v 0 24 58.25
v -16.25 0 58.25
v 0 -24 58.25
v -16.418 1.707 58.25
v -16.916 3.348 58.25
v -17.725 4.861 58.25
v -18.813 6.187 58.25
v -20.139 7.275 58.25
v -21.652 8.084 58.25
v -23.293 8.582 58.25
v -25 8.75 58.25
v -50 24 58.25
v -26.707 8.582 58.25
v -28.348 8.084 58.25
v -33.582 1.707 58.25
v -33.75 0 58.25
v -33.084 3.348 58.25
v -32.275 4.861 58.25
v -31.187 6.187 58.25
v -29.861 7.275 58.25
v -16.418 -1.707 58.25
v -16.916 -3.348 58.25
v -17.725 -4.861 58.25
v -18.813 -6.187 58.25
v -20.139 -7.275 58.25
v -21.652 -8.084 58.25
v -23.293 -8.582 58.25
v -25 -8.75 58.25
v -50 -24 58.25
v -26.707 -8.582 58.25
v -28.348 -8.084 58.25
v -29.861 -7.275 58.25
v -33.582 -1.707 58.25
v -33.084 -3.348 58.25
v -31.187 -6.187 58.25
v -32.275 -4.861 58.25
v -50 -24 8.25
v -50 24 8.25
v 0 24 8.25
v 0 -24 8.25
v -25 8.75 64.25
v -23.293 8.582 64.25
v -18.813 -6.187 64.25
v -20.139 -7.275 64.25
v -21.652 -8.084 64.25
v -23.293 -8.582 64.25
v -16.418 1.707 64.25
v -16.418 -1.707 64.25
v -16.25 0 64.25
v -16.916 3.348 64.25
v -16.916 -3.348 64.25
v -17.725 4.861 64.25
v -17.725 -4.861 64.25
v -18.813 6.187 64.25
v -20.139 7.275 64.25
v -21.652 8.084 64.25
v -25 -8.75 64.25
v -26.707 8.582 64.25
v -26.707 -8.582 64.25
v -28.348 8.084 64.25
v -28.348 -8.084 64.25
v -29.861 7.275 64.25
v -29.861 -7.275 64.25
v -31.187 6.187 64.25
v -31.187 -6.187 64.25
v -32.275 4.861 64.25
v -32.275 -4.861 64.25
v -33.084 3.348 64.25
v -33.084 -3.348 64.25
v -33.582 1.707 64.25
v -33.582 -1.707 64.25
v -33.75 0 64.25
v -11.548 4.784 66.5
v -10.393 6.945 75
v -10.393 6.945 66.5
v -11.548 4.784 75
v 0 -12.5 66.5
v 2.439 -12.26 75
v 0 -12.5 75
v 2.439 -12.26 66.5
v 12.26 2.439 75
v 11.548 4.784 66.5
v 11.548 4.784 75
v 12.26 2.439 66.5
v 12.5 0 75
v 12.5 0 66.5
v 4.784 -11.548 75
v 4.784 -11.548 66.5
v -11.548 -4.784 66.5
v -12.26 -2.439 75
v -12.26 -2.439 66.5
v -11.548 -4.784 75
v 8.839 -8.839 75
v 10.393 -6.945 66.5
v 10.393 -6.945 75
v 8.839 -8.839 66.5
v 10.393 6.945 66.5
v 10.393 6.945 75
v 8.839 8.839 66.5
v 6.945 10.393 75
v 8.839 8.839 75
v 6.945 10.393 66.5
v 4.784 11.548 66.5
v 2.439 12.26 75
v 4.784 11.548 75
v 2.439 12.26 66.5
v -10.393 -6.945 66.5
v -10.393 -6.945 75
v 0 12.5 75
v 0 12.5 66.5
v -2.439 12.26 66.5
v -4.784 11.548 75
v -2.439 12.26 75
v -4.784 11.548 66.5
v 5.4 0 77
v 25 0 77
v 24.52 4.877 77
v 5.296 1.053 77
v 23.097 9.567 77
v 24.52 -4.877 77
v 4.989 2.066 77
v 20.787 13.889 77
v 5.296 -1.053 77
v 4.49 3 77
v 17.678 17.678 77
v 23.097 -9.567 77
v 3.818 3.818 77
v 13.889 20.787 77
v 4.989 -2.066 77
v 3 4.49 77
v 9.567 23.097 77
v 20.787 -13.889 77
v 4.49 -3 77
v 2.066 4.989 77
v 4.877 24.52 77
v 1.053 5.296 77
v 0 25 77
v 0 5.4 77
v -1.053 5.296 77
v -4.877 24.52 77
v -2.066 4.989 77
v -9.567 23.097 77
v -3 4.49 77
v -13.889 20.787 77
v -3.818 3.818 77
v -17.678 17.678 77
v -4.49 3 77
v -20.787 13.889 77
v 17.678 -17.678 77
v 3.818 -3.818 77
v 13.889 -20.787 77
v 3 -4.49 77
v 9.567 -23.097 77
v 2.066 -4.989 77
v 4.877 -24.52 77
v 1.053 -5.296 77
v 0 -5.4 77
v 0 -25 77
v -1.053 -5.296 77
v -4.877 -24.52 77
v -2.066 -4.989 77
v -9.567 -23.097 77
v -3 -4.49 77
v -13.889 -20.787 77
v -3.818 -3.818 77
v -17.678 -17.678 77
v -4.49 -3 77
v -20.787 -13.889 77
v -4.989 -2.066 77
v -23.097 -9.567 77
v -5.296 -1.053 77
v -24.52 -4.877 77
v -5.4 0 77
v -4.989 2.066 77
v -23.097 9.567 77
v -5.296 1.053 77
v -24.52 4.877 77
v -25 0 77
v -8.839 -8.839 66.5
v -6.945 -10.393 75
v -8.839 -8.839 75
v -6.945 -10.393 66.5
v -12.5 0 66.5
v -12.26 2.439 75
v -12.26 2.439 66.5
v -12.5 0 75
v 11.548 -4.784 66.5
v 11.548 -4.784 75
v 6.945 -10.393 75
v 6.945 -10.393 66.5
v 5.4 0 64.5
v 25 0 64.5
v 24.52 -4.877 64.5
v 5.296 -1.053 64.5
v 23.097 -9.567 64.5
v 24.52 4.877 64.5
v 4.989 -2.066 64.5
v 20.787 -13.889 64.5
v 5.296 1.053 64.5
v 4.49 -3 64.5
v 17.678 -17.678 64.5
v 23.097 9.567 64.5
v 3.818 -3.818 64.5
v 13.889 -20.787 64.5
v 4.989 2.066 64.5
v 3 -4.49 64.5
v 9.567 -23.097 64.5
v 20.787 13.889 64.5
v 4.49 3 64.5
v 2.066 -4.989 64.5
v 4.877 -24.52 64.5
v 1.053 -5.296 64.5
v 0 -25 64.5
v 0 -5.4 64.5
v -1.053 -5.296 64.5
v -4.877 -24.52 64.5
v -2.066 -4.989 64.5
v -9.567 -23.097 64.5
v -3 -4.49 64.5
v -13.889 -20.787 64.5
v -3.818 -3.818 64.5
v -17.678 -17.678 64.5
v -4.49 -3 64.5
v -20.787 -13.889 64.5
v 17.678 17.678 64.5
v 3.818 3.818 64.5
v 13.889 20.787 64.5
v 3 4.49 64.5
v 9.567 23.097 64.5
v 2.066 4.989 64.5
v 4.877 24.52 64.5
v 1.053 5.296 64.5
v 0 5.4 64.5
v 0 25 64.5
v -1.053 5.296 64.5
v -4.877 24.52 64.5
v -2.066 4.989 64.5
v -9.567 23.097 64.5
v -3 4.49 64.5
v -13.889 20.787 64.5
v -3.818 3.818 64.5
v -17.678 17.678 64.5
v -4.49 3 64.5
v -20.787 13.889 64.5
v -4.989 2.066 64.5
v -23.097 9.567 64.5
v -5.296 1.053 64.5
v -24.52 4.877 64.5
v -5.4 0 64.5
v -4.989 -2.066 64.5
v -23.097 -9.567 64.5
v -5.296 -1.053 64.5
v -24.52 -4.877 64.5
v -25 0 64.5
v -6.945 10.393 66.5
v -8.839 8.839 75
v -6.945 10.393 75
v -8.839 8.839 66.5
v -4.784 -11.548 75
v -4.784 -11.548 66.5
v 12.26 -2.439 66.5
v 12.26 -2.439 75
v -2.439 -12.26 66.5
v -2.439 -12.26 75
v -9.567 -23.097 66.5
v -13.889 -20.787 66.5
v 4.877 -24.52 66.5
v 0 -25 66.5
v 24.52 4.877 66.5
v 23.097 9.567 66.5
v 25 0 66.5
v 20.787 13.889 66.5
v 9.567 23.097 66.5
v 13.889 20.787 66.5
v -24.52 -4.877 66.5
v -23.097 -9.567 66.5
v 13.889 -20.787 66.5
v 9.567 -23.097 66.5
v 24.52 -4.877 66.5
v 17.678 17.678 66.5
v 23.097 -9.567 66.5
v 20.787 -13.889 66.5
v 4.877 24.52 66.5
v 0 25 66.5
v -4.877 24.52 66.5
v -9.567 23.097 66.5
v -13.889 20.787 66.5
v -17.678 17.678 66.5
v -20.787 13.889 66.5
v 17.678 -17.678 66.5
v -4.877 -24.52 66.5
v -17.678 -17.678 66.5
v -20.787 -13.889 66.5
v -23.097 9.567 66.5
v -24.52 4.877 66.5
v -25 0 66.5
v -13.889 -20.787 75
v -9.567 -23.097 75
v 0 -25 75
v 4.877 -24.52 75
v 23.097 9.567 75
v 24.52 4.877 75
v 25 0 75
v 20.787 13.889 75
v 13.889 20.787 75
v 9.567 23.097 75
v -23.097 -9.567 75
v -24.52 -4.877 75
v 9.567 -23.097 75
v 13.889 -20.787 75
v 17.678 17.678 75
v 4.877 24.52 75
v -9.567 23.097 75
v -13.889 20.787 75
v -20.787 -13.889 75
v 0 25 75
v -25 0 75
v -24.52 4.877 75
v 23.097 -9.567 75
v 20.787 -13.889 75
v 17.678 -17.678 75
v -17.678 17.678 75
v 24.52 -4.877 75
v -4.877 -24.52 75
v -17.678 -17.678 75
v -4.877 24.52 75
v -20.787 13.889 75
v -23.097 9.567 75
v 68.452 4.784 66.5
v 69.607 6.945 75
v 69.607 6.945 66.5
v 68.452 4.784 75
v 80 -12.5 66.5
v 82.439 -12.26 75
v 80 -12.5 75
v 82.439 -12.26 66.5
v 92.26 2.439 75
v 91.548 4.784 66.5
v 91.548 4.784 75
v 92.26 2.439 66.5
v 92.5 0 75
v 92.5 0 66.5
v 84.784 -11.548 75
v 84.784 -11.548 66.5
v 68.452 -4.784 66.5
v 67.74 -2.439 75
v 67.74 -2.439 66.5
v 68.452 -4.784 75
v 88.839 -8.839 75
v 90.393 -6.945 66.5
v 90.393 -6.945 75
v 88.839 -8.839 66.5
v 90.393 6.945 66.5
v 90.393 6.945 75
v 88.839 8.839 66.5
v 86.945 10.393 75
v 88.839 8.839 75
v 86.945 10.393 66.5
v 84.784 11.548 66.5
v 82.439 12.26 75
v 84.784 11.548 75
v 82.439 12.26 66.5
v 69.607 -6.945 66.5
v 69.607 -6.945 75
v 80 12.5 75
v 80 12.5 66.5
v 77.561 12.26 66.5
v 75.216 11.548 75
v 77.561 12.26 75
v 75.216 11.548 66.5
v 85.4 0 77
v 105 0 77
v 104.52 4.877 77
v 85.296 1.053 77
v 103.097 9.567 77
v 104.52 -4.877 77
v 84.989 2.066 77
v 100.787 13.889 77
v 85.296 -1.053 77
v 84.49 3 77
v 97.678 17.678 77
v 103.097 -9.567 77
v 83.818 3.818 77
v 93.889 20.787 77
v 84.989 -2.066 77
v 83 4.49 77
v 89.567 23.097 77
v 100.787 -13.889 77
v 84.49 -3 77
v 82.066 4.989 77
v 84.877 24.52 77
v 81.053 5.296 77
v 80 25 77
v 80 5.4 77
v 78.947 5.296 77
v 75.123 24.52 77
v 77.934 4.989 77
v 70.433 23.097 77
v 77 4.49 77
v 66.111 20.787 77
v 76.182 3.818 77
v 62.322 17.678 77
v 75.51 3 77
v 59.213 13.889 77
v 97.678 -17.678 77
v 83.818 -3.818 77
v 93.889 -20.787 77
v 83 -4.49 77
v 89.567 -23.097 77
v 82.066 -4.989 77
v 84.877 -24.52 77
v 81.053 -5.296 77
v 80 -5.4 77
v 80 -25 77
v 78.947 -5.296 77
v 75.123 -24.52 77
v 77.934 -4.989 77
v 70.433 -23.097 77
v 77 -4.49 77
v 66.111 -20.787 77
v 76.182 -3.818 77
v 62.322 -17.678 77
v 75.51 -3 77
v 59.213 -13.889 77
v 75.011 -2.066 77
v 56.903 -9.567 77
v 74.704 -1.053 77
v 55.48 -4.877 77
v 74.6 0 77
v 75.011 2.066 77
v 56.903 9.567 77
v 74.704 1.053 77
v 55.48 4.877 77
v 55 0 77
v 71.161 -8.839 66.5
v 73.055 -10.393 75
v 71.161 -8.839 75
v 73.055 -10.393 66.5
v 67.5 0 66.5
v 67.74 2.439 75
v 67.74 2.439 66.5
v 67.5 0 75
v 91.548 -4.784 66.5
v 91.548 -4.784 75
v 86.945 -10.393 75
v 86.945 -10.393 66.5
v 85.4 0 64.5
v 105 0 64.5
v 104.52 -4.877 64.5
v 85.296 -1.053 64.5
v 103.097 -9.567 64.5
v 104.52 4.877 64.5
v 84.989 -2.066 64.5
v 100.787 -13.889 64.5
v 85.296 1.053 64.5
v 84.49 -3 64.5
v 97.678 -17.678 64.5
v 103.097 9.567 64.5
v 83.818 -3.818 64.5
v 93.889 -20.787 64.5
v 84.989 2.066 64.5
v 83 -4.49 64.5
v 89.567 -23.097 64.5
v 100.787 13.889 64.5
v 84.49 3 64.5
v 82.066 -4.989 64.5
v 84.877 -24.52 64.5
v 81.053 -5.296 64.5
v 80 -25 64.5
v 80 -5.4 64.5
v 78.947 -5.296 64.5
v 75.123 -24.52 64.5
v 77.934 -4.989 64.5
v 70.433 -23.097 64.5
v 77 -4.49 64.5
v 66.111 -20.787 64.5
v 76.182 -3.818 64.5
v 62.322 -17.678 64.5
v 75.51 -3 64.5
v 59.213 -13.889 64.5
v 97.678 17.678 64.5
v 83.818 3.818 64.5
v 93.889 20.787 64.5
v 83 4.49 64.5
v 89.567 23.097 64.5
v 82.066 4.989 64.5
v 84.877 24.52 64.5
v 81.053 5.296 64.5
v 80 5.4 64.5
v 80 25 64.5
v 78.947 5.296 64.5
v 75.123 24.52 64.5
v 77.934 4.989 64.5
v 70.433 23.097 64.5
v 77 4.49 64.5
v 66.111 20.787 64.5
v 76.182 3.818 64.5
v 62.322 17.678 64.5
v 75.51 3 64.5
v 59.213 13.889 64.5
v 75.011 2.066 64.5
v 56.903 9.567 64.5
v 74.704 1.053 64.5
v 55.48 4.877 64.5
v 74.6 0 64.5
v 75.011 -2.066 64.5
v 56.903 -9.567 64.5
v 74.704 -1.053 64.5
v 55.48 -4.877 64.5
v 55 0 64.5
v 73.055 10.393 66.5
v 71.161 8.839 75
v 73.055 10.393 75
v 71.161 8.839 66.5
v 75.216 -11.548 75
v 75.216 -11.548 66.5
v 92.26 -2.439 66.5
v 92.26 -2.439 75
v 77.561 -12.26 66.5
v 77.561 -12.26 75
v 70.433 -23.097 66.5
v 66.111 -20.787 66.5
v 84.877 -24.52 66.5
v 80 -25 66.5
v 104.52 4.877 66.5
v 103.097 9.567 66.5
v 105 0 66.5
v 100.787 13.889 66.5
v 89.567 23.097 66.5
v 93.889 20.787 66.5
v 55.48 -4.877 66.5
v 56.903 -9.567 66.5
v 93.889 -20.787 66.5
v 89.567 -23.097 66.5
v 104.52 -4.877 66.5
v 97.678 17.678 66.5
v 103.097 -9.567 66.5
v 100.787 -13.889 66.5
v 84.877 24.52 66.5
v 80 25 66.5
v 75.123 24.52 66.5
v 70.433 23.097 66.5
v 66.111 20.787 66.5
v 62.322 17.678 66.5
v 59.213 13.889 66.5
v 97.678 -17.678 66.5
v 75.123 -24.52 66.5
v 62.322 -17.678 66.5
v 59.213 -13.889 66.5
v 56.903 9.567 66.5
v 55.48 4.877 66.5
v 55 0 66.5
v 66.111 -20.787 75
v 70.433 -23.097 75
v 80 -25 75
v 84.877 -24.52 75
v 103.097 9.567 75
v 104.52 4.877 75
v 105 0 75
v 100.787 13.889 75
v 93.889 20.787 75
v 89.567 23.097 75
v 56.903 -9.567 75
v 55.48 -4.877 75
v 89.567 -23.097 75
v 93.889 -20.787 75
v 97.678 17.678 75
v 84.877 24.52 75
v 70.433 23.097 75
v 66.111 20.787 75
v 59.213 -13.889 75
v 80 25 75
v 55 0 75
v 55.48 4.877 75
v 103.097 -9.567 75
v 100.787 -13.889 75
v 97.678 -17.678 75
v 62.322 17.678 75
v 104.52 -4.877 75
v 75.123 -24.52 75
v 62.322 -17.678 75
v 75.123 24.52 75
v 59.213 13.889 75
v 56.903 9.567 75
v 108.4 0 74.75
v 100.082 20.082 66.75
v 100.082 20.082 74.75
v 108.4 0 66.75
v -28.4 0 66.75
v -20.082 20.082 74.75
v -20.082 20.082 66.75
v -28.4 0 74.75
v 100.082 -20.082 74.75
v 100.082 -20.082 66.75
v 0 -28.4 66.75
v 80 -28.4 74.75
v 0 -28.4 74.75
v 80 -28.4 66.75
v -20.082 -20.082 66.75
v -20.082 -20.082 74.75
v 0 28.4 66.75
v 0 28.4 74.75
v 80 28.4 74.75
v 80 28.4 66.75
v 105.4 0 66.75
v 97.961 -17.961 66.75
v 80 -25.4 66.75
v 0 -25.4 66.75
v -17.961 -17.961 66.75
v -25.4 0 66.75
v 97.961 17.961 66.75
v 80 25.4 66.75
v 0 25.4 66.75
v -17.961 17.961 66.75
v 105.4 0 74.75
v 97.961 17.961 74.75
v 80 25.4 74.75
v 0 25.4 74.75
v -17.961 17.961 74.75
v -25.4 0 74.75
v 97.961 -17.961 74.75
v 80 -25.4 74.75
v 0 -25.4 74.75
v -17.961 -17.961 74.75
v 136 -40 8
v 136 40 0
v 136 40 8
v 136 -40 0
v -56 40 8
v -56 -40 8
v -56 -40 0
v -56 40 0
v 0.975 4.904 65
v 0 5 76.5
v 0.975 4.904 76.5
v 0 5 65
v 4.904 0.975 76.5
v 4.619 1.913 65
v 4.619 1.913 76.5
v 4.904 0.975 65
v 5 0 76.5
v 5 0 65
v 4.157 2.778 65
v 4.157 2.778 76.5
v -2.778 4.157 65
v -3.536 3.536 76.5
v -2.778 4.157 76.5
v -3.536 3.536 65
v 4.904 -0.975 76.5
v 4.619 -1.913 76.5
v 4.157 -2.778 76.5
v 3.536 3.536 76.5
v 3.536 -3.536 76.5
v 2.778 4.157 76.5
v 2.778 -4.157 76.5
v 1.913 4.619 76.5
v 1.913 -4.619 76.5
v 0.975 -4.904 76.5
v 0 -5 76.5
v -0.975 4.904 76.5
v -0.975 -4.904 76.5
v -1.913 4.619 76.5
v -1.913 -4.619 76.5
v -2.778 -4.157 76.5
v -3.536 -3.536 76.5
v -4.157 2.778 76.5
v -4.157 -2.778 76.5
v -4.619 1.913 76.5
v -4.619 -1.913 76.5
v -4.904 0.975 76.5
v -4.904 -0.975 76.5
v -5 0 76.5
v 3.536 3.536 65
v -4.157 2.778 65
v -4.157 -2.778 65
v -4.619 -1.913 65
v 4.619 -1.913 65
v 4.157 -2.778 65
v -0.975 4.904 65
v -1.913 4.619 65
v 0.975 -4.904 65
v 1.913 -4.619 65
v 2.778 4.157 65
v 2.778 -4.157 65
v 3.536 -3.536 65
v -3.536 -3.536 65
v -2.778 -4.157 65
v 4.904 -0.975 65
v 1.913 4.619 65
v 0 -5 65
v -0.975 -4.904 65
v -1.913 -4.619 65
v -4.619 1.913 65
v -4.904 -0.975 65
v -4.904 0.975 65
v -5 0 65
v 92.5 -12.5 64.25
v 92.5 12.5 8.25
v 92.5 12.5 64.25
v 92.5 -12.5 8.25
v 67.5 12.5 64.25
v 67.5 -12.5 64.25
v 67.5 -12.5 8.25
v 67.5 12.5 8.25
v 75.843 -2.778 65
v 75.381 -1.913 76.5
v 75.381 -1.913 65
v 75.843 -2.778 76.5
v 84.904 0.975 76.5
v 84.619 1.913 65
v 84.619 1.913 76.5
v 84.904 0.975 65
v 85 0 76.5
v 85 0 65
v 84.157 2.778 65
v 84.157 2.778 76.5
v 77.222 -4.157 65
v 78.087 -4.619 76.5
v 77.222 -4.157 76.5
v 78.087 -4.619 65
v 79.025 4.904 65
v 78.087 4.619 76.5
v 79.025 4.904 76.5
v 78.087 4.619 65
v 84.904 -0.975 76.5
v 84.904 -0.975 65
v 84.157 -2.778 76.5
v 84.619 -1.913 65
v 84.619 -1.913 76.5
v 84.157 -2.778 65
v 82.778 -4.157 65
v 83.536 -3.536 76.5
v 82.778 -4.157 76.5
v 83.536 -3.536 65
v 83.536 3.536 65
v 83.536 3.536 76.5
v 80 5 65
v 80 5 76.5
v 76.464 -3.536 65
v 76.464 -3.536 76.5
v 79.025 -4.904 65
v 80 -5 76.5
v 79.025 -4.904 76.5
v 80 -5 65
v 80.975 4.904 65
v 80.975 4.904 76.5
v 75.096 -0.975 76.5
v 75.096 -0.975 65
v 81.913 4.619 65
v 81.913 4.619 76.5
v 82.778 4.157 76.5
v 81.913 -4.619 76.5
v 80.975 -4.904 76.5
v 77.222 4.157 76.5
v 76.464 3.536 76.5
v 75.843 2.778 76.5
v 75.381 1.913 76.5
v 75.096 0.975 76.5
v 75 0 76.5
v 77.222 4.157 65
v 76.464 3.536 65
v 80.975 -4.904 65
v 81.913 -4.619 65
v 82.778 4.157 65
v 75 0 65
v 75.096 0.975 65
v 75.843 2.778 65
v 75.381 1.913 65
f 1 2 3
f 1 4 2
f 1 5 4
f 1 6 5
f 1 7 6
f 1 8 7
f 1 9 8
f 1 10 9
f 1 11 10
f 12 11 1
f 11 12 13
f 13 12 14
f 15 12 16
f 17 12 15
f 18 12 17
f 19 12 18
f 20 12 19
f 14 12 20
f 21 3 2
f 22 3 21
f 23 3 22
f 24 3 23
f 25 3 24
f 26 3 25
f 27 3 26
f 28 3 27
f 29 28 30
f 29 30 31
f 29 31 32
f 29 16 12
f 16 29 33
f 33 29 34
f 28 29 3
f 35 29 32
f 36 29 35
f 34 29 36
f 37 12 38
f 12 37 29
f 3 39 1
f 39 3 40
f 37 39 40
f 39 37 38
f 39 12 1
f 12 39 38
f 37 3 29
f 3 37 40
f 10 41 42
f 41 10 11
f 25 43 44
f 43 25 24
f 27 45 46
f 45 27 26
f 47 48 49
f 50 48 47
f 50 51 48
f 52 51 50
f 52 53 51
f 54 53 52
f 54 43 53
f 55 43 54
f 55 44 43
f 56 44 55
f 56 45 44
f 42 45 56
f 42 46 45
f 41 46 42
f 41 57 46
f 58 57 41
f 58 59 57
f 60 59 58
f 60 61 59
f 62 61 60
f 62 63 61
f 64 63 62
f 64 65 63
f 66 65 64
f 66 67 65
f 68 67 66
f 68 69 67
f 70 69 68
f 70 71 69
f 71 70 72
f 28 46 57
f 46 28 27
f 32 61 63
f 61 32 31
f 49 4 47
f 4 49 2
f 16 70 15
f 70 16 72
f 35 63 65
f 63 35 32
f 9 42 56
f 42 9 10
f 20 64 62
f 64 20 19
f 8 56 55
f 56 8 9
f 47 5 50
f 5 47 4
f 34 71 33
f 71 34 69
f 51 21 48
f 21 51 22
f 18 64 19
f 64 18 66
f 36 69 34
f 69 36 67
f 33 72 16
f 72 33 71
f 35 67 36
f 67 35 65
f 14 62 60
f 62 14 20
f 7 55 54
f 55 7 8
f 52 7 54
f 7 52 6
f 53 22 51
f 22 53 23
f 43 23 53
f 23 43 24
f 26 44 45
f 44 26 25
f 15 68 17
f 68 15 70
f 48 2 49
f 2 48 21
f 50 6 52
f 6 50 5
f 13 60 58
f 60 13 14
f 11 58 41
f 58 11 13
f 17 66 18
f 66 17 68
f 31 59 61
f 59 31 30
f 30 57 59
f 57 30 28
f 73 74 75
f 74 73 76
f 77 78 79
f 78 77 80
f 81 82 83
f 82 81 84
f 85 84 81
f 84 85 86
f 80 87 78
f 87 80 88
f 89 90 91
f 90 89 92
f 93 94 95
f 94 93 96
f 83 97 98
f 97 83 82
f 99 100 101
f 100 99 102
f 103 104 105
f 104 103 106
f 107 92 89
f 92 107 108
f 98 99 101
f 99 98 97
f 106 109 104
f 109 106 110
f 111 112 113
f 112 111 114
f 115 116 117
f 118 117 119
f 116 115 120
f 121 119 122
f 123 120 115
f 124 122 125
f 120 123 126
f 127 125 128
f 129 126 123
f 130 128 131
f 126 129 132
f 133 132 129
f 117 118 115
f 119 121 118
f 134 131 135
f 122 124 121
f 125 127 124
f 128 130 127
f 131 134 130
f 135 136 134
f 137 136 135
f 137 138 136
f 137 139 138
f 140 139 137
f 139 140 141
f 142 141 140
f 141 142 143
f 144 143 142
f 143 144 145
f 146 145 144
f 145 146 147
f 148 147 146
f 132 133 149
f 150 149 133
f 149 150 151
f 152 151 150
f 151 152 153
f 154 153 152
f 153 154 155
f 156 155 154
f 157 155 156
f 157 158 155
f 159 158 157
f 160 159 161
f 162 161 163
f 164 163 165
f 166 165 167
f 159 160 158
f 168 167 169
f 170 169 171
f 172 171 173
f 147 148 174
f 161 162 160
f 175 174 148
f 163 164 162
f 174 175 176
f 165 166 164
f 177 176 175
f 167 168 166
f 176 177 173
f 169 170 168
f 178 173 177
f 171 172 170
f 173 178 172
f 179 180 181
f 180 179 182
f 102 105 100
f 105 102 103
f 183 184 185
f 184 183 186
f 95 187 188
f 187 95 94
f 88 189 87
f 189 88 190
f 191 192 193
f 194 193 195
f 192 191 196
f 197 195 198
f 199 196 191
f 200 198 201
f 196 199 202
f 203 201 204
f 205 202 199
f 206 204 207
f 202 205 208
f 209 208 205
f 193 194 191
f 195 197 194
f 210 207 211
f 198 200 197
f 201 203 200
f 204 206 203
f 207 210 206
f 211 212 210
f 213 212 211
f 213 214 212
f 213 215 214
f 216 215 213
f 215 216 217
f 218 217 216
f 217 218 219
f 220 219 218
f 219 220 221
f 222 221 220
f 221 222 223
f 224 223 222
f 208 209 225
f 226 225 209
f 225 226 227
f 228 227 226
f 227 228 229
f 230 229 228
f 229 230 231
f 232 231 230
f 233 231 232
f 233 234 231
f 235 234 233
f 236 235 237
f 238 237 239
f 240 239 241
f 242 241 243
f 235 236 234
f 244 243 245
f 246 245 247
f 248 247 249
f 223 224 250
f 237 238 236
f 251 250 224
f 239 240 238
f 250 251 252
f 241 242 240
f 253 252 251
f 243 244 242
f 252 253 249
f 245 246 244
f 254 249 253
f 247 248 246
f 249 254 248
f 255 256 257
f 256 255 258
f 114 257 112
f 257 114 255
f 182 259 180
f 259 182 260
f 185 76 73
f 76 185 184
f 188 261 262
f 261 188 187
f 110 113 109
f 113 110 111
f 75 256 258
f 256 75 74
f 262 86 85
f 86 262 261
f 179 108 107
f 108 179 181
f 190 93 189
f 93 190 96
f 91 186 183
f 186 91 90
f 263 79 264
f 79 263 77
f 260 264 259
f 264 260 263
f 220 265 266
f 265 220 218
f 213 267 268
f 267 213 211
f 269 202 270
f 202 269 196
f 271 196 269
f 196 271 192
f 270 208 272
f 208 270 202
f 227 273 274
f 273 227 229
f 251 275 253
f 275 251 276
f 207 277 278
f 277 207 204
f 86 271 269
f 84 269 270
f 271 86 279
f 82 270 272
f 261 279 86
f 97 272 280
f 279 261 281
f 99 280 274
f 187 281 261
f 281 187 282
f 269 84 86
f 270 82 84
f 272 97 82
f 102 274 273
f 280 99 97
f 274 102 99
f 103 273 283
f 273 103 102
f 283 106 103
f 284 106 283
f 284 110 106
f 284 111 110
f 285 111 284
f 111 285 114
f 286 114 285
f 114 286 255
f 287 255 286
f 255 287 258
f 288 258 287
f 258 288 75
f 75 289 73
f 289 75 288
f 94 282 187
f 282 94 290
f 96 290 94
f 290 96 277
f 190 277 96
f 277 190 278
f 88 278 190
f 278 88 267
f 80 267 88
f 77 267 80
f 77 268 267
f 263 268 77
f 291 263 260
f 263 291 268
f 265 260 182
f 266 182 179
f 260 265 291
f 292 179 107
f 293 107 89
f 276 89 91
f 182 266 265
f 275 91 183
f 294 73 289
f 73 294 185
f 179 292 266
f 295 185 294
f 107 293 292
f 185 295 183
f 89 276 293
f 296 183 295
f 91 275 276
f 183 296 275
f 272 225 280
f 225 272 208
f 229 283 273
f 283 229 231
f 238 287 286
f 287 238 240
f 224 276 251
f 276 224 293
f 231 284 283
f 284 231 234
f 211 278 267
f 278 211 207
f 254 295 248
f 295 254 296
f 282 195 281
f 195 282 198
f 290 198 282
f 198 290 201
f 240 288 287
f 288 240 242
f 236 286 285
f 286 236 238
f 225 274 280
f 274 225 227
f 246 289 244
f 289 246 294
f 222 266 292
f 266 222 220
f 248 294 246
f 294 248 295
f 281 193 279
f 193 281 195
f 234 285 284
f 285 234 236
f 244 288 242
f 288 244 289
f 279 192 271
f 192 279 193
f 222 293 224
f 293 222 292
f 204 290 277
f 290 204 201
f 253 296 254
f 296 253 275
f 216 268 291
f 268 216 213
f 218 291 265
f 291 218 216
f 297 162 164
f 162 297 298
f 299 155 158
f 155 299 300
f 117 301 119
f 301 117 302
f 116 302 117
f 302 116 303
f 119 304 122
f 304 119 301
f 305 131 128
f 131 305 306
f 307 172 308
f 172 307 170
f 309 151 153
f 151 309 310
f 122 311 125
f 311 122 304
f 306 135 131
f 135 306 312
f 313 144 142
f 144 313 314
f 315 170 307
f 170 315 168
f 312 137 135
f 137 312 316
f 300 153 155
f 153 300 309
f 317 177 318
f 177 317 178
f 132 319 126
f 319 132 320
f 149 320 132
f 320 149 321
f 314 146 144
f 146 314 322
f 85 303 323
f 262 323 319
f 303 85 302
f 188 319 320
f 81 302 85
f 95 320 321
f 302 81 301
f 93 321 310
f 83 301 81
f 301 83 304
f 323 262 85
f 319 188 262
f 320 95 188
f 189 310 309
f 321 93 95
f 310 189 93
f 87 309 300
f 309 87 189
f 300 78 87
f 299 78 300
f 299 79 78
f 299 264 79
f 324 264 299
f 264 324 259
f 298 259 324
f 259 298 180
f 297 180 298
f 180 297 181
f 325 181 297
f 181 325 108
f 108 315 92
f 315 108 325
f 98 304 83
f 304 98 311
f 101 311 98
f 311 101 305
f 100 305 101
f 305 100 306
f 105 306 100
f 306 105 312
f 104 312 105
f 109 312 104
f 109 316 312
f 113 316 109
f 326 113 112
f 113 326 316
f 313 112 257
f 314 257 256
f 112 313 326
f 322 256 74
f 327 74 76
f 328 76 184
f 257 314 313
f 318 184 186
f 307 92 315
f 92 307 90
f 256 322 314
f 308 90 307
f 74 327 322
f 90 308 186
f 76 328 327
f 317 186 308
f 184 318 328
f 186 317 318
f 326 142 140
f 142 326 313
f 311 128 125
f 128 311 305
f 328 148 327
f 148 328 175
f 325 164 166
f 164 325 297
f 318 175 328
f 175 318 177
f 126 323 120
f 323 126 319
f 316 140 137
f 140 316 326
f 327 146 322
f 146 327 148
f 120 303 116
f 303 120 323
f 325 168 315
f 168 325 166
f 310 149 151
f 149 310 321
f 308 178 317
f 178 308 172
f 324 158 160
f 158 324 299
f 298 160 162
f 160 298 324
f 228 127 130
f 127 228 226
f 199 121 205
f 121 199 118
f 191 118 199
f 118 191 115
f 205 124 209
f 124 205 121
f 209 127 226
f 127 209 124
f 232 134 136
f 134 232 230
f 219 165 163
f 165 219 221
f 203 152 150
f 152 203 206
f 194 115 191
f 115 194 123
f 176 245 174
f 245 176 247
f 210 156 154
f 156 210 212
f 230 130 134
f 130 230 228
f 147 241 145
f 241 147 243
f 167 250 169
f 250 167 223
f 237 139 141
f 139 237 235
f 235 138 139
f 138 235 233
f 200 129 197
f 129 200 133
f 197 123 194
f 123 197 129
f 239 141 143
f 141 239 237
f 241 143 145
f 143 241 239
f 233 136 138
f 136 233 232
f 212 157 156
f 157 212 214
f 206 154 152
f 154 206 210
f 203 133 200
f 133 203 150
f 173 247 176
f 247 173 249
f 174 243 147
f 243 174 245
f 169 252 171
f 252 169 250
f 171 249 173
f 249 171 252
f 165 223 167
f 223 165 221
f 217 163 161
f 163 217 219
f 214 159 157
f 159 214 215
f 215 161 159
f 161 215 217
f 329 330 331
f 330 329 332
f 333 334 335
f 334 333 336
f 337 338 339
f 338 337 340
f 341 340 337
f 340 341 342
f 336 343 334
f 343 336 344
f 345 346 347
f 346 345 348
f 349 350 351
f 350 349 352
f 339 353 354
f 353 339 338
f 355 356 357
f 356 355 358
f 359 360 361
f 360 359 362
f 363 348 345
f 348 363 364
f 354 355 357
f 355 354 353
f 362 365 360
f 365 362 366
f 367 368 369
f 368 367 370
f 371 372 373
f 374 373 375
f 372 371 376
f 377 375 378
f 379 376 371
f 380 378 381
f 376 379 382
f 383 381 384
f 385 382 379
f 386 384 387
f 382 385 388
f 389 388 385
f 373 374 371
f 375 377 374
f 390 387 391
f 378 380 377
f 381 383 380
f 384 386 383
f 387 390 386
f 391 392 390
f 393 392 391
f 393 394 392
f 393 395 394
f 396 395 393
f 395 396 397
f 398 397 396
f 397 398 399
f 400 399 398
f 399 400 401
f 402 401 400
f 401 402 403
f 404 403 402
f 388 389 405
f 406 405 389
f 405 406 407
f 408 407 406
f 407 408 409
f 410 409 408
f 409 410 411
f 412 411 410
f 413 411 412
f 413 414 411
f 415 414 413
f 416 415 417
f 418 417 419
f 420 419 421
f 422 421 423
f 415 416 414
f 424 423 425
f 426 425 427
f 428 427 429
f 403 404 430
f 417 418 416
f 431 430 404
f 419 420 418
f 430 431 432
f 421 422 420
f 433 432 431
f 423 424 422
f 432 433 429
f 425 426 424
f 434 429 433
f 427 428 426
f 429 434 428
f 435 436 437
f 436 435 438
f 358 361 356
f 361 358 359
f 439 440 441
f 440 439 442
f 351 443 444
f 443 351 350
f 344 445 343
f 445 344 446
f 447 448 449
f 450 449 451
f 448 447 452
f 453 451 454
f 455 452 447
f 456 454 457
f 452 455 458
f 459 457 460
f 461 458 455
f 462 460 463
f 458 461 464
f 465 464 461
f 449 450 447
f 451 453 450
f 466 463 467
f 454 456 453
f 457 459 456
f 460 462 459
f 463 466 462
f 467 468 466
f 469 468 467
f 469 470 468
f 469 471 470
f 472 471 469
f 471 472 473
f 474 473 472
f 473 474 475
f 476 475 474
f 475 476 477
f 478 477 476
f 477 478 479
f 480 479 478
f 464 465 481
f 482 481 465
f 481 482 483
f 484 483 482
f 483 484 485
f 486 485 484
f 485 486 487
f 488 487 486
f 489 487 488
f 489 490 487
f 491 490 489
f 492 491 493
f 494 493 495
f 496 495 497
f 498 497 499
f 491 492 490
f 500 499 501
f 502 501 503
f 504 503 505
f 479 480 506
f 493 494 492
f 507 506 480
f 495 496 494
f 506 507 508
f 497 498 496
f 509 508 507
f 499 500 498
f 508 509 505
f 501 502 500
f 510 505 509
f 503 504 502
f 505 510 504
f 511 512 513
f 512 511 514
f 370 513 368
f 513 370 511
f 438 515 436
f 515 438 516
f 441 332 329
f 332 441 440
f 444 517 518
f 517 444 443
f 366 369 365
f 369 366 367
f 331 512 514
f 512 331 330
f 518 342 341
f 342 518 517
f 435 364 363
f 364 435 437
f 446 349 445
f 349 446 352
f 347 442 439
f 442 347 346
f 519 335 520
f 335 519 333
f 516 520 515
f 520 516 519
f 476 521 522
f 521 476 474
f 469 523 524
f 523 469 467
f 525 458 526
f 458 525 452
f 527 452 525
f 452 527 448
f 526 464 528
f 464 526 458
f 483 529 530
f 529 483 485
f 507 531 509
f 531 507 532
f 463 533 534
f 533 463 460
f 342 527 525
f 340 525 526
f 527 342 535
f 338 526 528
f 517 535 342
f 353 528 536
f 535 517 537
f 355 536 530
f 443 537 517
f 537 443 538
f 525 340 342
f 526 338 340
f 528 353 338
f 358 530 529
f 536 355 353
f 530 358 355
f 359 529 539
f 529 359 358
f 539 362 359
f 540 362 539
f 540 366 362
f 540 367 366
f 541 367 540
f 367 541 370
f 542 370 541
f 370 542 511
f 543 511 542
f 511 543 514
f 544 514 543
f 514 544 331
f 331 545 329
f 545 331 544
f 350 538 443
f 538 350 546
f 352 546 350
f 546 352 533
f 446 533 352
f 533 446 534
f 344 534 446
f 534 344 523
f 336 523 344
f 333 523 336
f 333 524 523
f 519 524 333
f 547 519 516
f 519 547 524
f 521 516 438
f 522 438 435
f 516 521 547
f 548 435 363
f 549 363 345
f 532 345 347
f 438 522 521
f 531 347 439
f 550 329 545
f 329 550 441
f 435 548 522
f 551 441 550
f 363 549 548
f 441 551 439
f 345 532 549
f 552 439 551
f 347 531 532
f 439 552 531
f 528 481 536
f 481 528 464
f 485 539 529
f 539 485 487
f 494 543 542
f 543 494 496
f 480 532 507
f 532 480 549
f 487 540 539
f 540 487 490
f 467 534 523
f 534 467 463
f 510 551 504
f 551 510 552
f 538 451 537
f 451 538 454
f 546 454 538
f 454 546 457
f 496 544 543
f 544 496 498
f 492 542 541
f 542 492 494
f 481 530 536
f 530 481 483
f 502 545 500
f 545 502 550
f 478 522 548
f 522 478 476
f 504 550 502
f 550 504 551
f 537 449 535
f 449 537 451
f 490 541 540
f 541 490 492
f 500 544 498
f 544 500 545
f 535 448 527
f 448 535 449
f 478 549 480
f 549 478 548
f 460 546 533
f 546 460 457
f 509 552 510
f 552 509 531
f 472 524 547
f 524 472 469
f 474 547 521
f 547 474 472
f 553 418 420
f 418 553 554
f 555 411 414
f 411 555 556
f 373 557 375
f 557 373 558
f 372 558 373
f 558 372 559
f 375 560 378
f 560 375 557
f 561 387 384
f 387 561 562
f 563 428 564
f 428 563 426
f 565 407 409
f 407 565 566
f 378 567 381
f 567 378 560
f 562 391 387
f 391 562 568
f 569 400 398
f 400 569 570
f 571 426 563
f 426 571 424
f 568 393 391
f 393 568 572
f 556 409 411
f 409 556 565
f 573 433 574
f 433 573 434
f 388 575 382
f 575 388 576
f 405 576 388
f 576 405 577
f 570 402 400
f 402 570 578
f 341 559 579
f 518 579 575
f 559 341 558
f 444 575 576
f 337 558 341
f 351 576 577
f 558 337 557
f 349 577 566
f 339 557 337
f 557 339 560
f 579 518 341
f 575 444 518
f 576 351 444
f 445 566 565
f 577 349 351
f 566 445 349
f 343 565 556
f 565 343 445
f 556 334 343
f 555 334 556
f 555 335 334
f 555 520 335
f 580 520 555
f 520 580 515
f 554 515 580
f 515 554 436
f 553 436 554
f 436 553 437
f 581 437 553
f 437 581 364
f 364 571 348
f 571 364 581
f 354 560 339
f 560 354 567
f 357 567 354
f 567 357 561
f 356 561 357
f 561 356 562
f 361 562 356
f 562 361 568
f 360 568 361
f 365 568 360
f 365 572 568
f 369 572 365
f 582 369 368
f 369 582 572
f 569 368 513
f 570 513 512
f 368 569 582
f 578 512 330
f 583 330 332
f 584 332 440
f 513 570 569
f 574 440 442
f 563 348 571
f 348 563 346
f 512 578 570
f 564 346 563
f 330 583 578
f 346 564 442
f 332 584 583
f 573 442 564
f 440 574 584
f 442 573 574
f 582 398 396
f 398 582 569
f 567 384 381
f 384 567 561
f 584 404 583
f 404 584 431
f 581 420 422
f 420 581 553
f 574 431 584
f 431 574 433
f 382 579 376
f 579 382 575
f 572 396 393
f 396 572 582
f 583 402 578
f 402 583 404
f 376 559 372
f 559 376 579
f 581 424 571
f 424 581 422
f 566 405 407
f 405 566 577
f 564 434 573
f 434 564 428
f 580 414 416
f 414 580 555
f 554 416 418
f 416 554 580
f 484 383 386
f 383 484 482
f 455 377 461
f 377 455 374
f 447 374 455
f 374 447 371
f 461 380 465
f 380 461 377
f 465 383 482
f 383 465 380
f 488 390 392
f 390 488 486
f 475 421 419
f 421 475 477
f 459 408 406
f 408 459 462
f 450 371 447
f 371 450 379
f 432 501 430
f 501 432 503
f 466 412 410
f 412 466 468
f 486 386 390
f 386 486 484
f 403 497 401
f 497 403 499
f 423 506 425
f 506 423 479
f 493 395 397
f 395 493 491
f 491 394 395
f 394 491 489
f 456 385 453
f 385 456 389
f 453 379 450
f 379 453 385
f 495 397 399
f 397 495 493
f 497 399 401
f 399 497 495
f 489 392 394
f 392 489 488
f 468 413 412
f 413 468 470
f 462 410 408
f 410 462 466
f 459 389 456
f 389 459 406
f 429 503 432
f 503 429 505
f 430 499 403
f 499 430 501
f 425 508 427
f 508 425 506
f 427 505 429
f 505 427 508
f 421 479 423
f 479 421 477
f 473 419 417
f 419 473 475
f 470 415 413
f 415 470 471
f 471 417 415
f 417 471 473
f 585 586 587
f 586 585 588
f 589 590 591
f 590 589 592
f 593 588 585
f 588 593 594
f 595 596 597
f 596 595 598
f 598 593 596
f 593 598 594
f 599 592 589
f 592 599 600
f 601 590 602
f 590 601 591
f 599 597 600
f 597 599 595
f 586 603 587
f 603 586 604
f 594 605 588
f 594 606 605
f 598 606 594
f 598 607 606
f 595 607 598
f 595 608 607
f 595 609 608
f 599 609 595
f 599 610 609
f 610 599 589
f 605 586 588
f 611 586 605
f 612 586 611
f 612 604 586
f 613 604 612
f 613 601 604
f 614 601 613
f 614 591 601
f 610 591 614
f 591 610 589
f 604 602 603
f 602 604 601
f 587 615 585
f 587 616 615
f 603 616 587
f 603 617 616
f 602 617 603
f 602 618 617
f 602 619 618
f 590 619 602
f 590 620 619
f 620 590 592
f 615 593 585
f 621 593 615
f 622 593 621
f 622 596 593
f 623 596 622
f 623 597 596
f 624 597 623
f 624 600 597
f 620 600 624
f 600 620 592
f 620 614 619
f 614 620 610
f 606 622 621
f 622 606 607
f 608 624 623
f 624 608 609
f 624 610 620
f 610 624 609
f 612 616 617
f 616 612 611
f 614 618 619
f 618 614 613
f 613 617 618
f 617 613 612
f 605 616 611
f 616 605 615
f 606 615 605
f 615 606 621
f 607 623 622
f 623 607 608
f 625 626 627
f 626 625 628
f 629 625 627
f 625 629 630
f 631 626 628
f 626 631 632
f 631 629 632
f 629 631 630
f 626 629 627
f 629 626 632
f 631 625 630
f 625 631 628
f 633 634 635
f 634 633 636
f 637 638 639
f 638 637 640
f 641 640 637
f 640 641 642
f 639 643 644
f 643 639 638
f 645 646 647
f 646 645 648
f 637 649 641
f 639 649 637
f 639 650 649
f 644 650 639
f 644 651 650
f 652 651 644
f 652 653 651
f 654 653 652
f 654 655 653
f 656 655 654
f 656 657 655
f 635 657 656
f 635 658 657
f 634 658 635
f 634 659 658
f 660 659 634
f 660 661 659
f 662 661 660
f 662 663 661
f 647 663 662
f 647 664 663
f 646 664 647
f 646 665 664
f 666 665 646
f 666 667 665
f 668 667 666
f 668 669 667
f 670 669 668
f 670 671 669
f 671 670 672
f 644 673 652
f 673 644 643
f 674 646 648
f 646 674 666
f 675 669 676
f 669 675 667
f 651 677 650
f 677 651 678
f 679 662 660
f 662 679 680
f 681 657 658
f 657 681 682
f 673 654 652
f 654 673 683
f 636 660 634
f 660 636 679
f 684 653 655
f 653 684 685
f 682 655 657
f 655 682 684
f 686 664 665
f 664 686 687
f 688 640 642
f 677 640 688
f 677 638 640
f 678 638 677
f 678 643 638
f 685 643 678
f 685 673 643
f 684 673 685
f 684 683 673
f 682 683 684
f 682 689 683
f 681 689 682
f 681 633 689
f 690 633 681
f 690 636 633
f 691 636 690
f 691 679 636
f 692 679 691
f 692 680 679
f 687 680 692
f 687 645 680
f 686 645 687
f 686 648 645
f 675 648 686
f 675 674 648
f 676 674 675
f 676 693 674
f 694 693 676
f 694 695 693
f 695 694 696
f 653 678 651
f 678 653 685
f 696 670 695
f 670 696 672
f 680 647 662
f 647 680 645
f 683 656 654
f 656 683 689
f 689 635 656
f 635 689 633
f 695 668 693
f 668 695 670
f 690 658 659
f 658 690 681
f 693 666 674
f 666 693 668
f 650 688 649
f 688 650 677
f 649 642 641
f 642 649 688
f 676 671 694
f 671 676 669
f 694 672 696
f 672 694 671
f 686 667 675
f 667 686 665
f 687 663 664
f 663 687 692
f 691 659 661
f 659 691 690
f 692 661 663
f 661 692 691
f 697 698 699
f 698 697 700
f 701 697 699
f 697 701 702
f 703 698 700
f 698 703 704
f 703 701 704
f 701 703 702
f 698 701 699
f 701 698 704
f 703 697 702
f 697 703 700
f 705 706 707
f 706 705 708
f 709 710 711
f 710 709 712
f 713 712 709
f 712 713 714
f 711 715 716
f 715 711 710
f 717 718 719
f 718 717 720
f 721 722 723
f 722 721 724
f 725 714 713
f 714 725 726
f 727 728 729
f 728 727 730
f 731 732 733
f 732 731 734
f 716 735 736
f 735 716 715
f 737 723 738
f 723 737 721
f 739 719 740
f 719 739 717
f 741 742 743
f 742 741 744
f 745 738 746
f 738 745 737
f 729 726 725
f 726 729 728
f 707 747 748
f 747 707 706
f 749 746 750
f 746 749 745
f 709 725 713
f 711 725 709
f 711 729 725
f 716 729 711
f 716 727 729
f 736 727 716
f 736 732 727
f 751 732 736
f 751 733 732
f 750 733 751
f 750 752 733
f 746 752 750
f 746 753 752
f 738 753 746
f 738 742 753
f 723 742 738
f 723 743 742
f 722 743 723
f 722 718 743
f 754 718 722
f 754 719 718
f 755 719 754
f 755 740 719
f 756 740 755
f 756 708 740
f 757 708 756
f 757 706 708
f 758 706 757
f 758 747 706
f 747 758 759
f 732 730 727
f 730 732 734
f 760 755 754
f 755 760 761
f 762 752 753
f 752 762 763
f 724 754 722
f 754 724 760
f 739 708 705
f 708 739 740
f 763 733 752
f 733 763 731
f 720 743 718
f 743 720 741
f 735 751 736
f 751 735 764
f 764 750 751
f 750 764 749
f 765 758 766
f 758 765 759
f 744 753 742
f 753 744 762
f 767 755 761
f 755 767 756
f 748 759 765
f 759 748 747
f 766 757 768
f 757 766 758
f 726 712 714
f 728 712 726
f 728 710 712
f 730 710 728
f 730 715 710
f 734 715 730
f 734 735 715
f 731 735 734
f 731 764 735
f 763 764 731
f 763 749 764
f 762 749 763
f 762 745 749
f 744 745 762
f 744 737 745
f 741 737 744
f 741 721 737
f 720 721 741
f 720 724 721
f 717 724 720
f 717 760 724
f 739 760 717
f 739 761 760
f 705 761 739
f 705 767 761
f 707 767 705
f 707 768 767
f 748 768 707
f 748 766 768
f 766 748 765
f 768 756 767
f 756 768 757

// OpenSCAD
$fn = 32;

// ------------------------------------------------------------------------
// Motor belt drive: span 80 mm, pulleys d50, belt 8 mm wide
// Every part is its own module, assembly() places every instance.
// ------------------------------------------------------------------------

// --- part 1 ---
module base_plate() {
  difference() {
    translate([-96, -40, 0]) cube([192, 80, 8]);
  }
}

// --- part 2 ---
module motor() {
  union() {
    translate([-25, -24, 0]) cube([50, 48, 50]);
    translate([28, 0, 25]) rotate([0, 90, 0]) cylinder(h = 6, d = 17.5, center = true);
  }
}

// --- part 3 ---
module drive_shaft() {
  translate([0, 0, -5.75]) cylinder(h = 11.5, d = 10);
}

// --- part 4 ---
module pulley_drive() {
  difference() {
    union() {
      cylinder(h = 12.5, d = 25);
      cylinder(h = 2, d = 50);
      translate([0, 0, 10.5]) cylinder(h = 2, d = 50);
    }
    translate([0, 0, -1]) cylinder(h = 14.5, d = 10.8);
  }
}

// --- part 5 ---
module idler_post() {
  translate([-12.5, -12.5, 0]) cube([25, 25, 56]);
}

// --- part 6 ---
module driven_shaft() {
  translate([0, 0, -5.75]) cylinder(h = 11.5, d = 10);
}

// --- part 7 ---
module pulley_driven() {
  difference() {
    union() {
      cylinder(h = 12.5, d = 25);
      cylinder(h = 2, d = 50);
      translate([0, 0, 10.5]) cylinder(h = 2, d = 50);
    }
    translate([0, 0, -1]) cylinder(h = 14.5, d = 10.8);
  }
}

// --- part 8 ---
module drive_belt() {
  difference() {
    linear_extrude(height = 8) polygon(points = concat([for (a = [90 : 45 : 270]) [28.4 * cos(a), 28.4 * sin(a)]], [for (a = [270 : 45 : 450]) [80 + 28.4 * cos(a), 28.4 * sin(a)]]));
    translate([0, 0, -1]) linear_extrude(height = 10) polygon(points = concat([for (a = [90 : 45 : 270]) [25.4 * cos(a), 25.4 * sin(a)]], [for (a = [270 : 45 : 450]) [80 + 25.4 * cos(a), 25.4 * sin(a)]]));
  }
}

// --- assembly ---
module assembly() {
  color([0.80, 0.24, 0.20]) translate([40, 0, 0]) rotate([0, 0, 0]) base_plate();
  color([0.20, 0.45, 0.75]) translate([0, 0, 33.25]) rotate([0, 270, 0]) motor();
  color([0.25, 0.62, 0.32]) translate([0, 0, 70.75]) rotate([0, 0, 0]) drive_shaft();
  color([0.92, 0.70, 0.18]) translate([0, 0, 64.5]) rotate([0, 0, 0]) pulley_drive();
  color([0.58, 0.35, 0.70]) translate([80, 0, 8.25]) rotate([0, 0, 0]) idler_post();
  color([0.16, 0.66, 0.66]) translate([80, 0, 70.75]) rotate([0, 0, 0]) driven_shaft();
  color([0.85, 0.48, 0.18]) translate([80, 0, 64.5]) rotate([0, 0, 0]) pulley_driven();
  color([0.55, 0.60, 0.65]) translate([0, 0, 66.75]) rotate([0, 0, 0]) drive_belt();
}

assembly();
